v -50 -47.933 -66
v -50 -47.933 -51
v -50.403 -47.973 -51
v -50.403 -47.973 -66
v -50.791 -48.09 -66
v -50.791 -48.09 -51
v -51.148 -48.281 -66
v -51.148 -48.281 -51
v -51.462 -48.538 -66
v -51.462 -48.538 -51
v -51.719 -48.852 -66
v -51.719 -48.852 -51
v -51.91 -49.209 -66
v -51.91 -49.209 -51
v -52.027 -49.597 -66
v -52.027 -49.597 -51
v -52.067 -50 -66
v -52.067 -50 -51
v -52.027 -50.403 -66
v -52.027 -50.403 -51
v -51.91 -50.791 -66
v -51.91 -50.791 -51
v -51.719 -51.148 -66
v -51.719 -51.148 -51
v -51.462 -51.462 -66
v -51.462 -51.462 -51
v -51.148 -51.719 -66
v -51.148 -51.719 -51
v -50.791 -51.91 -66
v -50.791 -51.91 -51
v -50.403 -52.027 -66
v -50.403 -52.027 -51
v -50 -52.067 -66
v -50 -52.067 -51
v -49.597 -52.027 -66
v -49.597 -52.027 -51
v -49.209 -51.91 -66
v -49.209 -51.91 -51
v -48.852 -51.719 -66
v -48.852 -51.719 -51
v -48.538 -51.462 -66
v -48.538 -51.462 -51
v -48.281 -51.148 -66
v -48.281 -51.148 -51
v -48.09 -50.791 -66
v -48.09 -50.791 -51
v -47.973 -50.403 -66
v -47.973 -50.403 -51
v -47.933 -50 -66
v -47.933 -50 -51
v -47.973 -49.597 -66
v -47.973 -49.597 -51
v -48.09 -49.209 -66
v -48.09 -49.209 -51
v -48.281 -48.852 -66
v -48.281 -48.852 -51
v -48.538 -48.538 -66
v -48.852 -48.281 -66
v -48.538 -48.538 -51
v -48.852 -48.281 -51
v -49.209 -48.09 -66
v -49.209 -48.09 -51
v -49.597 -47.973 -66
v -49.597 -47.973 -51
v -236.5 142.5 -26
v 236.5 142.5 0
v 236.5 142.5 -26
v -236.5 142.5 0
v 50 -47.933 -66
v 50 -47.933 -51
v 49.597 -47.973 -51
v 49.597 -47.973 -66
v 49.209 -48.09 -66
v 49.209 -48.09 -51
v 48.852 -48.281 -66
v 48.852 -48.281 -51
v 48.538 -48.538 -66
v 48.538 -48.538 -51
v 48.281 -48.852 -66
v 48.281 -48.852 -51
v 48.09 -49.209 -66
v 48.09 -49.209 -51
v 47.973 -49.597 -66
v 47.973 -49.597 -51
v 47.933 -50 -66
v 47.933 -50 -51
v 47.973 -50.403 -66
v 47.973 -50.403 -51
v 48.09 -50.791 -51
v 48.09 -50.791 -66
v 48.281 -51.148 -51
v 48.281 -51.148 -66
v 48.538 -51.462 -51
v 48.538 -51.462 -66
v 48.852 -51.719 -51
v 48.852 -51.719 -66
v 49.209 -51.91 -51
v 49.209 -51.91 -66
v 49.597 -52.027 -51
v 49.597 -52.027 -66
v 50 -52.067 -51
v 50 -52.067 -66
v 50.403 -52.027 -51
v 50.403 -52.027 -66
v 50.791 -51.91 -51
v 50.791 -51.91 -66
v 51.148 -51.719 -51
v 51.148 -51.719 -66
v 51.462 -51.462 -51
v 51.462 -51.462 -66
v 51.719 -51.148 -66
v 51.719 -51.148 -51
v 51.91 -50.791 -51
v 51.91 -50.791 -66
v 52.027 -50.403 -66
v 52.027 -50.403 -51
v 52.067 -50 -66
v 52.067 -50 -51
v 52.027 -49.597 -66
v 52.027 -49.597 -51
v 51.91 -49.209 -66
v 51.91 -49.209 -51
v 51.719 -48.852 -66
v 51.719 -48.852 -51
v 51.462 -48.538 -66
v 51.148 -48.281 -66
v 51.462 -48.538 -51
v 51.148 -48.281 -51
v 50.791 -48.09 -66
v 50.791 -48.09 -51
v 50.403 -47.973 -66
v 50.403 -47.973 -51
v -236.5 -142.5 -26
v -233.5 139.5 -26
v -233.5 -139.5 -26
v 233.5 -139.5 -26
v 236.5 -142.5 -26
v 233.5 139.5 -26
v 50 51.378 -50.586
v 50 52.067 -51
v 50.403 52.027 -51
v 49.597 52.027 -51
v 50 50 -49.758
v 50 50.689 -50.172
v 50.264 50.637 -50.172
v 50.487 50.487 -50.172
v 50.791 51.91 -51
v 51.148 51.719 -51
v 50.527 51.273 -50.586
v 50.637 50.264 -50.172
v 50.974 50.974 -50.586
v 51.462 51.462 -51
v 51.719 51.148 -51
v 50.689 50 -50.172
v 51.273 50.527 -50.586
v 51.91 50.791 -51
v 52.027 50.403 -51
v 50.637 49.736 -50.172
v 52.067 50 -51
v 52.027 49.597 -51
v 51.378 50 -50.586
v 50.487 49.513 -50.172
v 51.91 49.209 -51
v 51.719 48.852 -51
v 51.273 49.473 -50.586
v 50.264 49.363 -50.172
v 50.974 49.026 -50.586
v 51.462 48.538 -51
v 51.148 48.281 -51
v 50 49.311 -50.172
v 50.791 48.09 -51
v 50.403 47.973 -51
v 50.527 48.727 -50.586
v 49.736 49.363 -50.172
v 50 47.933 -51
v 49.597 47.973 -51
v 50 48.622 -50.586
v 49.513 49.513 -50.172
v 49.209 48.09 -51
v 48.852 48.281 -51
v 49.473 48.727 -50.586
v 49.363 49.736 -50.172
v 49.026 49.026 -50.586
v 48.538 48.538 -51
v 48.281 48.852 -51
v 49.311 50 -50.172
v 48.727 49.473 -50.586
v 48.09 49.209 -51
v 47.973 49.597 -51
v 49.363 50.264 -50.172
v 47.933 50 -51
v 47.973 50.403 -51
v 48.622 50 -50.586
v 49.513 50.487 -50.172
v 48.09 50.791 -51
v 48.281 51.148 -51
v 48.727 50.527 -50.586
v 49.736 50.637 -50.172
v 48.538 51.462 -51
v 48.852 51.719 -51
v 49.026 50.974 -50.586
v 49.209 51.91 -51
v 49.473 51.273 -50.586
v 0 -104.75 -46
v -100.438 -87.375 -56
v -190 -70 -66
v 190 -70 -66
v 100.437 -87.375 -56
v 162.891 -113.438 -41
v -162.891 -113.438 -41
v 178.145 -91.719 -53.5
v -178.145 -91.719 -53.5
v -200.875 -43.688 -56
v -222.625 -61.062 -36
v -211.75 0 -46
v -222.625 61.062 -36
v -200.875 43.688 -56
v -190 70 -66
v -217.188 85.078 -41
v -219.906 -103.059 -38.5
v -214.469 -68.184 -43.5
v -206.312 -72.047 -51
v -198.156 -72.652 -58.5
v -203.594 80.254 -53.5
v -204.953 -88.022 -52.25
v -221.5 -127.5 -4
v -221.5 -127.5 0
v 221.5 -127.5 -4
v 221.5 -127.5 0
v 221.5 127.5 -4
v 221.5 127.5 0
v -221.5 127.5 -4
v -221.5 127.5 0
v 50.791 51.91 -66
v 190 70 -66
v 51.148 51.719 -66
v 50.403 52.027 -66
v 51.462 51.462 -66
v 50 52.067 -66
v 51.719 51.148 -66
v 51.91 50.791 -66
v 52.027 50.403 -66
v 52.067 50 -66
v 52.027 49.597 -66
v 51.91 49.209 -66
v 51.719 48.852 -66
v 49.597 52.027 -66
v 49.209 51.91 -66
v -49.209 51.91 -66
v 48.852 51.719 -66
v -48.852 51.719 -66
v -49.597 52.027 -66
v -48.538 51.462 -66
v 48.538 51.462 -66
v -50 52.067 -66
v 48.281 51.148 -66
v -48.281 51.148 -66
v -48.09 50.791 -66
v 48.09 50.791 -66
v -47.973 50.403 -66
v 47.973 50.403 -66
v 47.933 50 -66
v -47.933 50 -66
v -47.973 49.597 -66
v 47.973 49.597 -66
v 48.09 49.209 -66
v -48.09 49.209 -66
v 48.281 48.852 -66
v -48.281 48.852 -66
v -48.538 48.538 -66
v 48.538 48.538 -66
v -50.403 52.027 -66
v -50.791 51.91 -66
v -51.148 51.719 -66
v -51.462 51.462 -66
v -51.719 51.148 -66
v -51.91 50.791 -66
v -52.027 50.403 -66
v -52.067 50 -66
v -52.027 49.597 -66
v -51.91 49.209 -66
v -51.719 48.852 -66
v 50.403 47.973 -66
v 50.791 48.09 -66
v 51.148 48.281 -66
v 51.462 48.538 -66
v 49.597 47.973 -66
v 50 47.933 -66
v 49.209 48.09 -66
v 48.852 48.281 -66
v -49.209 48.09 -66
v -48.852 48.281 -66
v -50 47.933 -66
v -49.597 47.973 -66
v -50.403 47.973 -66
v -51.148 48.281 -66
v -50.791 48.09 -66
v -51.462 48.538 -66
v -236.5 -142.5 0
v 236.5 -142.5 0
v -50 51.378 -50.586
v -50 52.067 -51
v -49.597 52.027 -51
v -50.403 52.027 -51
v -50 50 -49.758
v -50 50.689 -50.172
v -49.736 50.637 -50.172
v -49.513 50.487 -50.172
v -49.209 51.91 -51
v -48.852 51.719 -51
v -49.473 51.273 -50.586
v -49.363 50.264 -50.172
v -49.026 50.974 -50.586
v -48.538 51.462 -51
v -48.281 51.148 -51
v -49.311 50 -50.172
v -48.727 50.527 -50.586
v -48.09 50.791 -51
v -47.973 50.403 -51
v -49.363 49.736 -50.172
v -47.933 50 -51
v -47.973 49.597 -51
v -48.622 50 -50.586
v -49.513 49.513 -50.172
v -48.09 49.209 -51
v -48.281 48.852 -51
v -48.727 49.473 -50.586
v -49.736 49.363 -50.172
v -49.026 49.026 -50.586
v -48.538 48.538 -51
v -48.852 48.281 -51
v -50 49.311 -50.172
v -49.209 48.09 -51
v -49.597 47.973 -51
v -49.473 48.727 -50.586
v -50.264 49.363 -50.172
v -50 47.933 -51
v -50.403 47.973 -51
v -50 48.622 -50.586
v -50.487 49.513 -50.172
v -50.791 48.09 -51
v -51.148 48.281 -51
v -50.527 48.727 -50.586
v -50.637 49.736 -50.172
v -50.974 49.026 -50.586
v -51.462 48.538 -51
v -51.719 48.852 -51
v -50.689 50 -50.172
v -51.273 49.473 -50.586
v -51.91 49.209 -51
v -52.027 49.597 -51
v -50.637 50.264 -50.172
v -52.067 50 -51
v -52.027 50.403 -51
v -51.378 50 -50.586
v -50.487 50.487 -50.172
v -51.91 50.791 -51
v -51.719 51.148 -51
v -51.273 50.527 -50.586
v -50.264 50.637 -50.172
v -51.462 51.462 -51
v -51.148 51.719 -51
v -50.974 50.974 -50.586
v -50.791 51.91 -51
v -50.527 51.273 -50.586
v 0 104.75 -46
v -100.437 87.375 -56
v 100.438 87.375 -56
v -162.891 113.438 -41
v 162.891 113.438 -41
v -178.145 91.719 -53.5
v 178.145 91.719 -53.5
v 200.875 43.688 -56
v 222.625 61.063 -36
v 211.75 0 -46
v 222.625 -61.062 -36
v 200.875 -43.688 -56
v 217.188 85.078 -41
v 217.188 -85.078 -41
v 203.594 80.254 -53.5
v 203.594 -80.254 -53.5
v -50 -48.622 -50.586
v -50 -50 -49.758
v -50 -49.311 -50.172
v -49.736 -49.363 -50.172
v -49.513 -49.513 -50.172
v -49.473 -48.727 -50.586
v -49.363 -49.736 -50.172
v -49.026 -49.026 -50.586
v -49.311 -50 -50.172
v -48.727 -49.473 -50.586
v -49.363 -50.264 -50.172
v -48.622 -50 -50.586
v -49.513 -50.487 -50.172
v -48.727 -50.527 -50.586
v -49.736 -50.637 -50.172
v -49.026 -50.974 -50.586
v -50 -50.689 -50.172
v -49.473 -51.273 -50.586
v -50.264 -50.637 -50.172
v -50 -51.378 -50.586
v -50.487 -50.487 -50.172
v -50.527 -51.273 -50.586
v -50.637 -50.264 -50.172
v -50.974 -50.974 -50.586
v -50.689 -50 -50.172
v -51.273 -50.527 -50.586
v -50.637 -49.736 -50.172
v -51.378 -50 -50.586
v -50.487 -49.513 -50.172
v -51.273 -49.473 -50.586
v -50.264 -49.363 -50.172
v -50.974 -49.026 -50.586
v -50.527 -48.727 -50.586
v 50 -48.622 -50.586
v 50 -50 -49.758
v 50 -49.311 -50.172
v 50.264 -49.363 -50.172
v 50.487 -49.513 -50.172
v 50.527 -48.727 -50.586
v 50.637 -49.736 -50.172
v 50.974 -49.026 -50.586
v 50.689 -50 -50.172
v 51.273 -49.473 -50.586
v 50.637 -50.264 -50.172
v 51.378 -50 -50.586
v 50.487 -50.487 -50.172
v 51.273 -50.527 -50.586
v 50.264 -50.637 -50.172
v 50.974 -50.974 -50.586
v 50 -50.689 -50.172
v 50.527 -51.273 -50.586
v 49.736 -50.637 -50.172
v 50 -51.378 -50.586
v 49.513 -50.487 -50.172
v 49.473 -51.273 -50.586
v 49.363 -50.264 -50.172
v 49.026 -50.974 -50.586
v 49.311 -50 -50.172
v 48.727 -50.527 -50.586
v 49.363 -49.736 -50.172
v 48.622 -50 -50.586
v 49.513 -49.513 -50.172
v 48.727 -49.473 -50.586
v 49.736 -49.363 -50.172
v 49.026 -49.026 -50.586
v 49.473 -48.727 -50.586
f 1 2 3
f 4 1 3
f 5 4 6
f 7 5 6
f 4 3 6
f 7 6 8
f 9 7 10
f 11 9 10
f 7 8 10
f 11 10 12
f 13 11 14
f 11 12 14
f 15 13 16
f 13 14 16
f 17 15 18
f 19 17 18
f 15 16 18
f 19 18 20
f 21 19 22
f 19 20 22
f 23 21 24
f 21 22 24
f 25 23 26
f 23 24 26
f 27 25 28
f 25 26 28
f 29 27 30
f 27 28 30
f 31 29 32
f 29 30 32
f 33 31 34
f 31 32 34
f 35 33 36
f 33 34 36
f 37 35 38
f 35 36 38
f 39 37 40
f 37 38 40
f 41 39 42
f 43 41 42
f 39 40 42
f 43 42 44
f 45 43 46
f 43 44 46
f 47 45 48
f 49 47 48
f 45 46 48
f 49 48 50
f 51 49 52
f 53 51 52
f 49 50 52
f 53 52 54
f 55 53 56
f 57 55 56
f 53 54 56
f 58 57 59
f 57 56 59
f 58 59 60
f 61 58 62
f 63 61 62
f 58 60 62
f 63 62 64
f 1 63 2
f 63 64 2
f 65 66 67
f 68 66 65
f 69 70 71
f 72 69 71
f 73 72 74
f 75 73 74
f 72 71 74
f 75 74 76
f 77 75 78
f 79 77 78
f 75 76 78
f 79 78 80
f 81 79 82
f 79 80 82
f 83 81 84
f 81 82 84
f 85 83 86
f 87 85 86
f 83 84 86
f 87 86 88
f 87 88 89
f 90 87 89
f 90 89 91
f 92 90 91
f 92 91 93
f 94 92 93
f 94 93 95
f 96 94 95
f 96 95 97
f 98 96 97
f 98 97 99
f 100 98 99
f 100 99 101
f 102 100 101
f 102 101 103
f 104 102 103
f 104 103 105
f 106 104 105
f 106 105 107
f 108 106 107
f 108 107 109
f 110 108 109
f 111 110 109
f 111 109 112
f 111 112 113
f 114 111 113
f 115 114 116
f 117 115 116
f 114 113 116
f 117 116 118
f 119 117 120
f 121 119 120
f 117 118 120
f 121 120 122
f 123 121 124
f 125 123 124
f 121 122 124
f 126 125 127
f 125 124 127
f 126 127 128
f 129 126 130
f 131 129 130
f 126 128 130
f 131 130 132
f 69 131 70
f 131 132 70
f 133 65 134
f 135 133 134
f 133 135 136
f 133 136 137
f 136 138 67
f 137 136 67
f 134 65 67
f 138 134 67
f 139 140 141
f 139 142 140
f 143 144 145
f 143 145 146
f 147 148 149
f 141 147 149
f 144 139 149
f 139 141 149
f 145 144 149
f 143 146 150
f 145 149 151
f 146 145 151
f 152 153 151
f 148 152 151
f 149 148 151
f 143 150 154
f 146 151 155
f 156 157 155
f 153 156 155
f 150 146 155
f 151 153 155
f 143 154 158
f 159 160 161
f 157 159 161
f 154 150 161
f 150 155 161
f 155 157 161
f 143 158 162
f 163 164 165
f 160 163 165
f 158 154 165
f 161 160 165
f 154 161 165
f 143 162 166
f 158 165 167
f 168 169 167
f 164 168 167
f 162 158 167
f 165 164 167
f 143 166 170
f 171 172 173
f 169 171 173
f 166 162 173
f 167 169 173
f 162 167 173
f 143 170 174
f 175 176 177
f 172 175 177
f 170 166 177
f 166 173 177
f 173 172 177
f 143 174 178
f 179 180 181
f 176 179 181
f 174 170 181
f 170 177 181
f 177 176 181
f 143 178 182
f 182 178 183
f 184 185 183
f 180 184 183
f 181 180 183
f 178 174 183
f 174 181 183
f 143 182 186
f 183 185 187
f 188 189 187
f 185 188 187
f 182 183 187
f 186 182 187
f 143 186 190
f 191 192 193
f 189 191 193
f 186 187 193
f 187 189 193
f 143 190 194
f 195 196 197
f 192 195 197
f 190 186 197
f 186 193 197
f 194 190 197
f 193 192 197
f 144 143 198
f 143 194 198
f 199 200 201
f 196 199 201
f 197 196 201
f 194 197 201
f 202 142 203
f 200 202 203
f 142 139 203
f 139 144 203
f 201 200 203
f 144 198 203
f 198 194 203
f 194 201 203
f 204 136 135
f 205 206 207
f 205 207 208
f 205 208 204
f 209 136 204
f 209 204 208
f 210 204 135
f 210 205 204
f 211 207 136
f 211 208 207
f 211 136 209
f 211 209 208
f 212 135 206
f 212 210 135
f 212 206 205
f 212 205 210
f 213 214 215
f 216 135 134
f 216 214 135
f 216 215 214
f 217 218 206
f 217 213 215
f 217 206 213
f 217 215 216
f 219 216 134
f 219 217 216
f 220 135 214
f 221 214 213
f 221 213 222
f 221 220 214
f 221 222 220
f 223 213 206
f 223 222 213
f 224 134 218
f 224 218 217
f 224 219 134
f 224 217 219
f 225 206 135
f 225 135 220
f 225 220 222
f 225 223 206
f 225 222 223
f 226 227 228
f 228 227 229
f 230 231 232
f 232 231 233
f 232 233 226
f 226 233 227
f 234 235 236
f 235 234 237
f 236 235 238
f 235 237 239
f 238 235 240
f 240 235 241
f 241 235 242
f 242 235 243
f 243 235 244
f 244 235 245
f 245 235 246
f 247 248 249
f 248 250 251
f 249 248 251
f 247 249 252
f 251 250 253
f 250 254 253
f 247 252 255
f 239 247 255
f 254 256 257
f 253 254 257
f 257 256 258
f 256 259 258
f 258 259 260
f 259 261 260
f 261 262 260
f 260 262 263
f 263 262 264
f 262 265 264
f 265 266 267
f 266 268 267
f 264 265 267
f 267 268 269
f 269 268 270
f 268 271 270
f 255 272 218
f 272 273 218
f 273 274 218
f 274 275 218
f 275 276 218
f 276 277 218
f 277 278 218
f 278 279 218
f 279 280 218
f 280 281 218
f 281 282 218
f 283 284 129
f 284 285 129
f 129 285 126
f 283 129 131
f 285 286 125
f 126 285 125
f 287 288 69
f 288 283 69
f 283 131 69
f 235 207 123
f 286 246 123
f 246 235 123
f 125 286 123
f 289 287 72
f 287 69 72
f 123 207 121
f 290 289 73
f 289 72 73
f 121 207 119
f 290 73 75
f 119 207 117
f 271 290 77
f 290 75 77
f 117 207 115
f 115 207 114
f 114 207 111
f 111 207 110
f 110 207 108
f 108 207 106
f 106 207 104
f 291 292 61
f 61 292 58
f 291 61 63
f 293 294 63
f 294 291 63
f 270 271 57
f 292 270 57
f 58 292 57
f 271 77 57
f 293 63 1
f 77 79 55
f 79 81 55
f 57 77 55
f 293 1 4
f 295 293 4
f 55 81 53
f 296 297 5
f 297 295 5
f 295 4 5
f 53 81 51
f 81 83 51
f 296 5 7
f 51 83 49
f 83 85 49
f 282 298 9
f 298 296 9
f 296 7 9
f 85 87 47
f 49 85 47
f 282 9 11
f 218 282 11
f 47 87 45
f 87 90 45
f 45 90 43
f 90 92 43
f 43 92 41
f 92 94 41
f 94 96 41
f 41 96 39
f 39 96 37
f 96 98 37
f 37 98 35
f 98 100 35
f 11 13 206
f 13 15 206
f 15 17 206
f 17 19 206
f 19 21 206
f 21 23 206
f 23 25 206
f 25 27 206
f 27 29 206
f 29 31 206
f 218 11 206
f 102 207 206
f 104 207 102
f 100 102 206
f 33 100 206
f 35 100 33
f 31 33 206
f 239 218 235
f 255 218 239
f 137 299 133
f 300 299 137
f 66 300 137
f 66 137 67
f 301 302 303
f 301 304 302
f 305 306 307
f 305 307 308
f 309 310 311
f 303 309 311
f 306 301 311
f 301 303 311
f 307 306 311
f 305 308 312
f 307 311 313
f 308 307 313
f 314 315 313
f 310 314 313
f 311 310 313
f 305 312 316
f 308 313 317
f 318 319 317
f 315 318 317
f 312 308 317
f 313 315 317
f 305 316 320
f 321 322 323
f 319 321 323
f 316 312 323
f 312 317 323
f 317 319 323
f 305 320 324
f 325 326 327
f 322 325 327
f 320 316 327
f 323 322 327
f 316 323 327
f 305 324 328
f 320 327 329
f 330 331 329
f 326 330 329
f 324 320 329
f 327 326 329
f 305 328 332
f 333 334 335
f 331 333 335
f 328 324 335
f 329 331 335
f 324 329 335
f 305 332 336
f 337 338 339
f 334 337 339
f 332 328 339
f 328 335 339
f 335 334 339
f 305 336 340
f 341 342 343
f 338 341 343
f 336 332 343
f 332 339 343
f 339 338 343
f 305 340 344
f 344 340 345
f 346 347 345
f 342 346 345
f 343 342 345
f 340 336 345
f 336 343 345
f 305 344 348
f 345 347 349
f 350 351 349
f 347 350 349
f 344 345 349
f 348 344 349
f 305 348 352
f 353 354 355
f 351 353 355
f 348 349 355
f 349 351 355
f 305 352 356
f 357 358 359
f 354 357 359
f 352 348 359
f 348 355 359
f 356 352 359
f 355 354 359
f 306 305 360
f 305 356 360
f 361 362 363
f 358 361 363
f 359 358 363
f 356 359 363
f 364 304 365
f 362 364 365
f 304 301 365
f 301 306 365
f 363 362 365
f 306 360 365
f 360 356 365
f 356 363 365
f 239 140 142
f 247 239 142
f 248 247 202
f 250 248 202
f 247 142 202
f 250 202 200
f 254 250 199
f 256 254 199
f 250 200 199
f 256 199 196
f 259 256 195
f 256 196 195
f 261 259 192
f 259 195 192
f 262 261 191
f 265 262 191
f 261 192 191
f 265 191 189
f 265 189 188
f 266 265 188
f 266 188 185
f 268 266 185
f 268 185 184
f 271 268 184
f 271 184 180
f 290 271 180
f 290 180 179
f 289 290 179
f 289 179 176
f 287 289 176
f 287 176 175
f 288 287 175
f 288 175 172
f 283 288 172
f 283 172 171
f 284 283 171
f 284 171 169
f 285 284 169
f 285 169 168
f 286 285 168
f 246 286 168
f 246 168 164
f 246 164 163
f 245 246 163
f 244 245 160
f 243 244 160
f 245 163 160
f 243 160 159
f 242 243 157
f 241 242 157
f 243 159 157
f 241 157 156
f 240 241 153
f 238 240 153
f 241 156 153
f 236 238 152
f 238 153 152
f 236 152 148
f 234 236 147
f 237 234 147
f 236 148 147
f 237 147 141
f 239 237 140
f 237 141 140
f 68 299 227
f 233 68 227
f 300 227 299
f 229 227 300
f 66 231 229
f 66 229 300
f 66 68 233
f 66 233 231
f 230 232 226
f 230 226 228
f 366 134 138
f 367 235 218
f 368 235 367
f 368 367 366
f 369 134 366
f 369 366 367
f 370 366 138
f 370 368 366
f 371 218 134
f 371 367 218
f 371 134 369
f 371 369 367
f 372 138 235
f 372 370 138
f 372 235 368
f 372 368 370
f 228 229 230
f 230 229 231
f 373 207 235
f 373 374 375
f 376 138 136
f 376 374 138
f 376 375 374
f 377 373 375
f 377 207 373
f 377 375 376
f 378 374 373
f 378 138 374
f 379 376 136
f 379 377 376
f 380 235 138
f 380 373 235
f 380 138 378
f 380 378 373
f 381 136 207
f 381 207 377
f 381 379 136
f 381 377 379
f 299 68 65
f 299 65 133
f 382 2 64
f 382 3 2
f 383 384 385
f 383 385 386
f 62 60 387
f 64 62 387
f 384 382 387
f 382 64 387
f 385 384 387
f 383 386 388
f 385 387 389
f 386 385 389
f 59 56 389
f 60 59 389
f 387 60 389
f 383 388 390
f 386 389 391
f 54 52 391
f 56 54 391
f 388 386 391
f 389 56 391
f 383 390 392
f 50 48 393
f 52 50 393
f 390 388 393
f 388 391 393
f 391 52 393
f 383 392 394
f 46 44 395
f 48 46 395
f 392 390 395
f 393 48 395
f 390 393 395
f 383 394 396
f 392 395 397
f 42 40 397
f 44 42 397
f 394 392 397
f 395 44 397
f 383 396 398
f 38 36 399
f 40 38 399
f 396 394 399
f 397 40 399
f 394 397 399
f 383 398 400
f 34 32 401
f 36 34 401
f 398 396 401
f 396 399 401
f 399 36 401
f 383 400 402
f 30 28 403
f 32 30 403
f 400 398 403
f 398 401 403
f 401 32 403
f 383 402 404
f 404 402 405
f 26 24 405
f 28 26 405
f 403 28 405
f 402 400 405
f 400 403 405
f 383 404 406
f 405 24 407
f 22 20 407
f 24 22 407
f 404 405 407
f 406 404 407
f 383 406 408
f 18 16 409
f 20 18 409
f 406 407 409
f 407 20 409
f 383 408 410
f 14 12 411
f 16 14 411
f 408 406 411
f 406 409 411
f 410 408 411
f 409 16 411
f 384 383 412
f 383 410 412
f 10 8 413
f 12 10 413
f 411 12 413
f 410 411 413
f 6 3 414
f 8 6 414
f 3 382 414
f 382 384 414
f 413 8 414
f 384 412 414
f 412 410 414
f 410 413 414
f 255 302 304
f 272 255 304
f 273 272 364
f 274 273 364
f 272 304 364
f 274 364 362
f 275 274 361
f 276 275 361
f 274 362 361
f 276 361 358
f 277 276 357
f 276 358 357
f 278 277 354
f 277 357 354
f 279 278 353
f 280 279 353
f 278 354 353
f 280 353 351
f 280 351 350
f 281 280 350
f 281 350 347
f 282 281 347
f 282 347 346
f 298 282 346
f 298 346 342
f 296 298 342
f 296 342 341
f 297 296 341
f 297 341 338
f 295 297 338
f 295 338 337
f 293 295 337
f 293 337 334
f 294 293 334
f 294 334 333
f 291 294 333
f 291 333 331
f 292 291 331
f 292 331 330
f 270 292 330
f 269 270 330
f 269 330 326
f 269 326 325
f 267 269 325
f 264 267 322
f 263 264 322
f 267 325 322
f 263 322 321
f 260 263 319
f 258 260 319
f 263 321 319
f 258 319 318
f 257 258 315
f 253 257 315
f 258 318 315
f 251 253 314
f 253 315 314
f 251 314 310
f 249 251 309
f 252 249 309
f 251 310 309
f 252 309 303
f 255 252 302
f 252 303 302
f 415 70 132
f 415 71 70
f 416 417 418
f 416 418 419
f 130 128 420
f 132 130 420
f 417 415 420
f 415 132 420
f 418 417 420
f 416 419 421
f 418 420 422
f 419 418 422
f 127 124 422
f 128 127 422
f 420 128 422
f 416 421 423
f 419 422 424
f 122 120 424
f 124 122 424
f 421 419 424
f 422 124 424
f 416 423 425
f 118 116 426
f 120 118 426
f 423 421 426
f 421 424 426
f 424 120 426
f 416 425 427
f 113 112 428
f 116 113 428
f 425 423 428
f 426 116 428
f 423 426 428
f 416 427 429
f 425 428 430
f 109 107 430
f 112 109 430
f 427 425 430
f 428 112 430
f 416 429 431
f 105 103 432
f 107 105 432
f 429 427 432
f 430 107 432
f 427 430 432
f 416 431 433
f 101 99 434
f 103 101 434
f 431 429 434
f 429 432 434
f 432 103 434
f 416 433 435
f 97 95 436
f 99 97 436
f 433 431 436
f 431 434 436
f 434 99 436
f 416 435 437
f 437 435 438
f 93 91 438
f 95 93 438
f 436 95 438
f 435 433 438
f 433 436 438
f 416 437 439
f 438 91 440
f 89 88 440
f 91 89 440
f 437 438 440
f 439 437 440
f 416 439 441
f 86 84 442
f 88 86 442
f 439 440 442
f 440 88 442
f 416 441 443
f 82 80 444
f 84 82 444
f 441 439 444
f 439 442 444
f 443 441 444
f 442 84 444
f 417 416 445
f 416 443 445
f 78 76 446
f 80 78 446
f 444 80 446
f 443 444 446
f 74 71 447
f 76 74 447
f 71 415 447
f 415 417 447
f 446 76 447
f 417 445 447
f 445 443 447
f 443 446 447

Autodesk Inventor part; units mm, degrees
ref_plane "YZ Plane" through (0, 0, 0) normal (1, 0, 0) x (0, 1, 0)
ref_plane "XZ Plane" through (0, 0, 0) normal (0, 1, 0) x (-1, 0, 0)
sketch "Sketch1" plane through (0, 0, 0) normal (0, 0, 1) x (1, 0, 0)
  line L0 (-236.5, -142.5) -> (236.5, -142.5)
  line L1 (236.5, -142.5) -> (236.5, 142.5)
  line L2 (236.5, 142.5) -> (-236.5, 142.5)
  line L3 (-236.5, 142.5) -> (-236.5, -142.5)
  line L4 (-236.5, -142.5) -> (236.5, 142.5) construction
  line L5 (236.5, -142.5) -> (-236.5, 142.5) construction
  point P0 (0, 0)
  dimension "d0" = 473
  dimension "d1" = 285
extrude "Extrusion1" add sketch "Sketch1" against normal blind 26
sketch "Sketch2" plane through (0, 0, -26) normal (0, 0, -1) x (-1, 0, 0)
  line L0 (-233.5, -139.5) -> (233.5, -139.5)
  line L1 (233.5, -139.5) -> (233.5, 139.5)
  line L2 (233.5, 139.5) -> (-233.5, 139.5)
  line L3 (-233.5, 139.5) -> (-233.5, -139.5)
  line L4 (-233.5, -139.5) -> (233.5, 139.5) construction
  line L5 (233.5, -139.5) -> (-233.5, 139.5) construction
  line L6 (236.5, 142.5) -> (-236.5, 142.5) projected
  line L7 (-236.5, 142.5) -> (-236.5, -142.5) projected
  point P0 (0, 0)
  dimension "d4" = 3
  dimension "d5" = 3
ref_plane "Work Plane1" through (0, 0, -66) normal (0, 0, -1) x (-1, 0, 0)
sketch "Sketch4" plane through (0, 0, -66) normal (0, 0, -1) x (-1, 0, 0)
  line L0 (-190, -70) -> (190, -70)
  line L1 (190, -70) -> (190, 70)
  line L2 (190, 70) -> (-190, 70)
  line L3 (-190, 70) -> (-190, -70)
  line L4 (-190, -70) -> (190, 70) construction
  line L5 (190, -70) -> (-190, 70) construction
  point P0 (0, 0)
  dimension "d7" = 140
  dimension "d8" = 380
loft "Loft1" add profiles "Sketch2", "Sketch4"
sketch "Sketch5" plane through (190, -70, -66) normal (0, 0, -1) x (-1, 0, 0)
  line L0 (140, 20) -> (240, 20)
  line L1 (240, 20) -> (240, 120)
  line L2 (240, 120) -> (140, 120)
  line L3 (140, 120) -> (140, 20)
  line L4 (140, 20) -> (240, 120) construction
  line L5 (240, 20) -> (140, 120) construction
  point P0 (190, 70)
  dimension "d13" = 100
  dimension "d14" = 100
hole "Hole1" at (50, 50, -66) at (-50, 50, -66) at (-50, -50, -66) at (50, -50, -66) direction (0, 0, 1) diameter 4.134 depth 15 tip angle 118 thread size "M5x0.8" class "6H" standard "ANSI Metric M Profile"
sketch "Sketch6" plane through (0, 0, 0) normal (0, 0, 1) x (1, 0, 0)
  line L0 (-221.5, -127.5) -> (221.5, -127.5)
  line L1 (221.5, -127.5) -> (221.5, 127.5)
  line L2 (221.5, 127.5) -> (-221.5, 127.5)
  line L3 (-221.5, 127.5) -> (-221.5, -127.5)
  line L4 (-221.5, -127.5) -> (221.5, 127.5) construction
  line L5 (221.5, -127.5) -> (-221.5, 127.5) construction
  line L6 (236.5, 142.5) -> (-236.5, 142.5) projected
  line L7 (-236.5, 142.5) -> (-236.5, -142.5) projected
  point P0 (0, 0)
  dimension "d22" = 15
  dimension "d23" = 15
extrude "Extrusion2" cut sketch "Sketch6" against normal blind 4
properties part number "Monitor_21inch"
